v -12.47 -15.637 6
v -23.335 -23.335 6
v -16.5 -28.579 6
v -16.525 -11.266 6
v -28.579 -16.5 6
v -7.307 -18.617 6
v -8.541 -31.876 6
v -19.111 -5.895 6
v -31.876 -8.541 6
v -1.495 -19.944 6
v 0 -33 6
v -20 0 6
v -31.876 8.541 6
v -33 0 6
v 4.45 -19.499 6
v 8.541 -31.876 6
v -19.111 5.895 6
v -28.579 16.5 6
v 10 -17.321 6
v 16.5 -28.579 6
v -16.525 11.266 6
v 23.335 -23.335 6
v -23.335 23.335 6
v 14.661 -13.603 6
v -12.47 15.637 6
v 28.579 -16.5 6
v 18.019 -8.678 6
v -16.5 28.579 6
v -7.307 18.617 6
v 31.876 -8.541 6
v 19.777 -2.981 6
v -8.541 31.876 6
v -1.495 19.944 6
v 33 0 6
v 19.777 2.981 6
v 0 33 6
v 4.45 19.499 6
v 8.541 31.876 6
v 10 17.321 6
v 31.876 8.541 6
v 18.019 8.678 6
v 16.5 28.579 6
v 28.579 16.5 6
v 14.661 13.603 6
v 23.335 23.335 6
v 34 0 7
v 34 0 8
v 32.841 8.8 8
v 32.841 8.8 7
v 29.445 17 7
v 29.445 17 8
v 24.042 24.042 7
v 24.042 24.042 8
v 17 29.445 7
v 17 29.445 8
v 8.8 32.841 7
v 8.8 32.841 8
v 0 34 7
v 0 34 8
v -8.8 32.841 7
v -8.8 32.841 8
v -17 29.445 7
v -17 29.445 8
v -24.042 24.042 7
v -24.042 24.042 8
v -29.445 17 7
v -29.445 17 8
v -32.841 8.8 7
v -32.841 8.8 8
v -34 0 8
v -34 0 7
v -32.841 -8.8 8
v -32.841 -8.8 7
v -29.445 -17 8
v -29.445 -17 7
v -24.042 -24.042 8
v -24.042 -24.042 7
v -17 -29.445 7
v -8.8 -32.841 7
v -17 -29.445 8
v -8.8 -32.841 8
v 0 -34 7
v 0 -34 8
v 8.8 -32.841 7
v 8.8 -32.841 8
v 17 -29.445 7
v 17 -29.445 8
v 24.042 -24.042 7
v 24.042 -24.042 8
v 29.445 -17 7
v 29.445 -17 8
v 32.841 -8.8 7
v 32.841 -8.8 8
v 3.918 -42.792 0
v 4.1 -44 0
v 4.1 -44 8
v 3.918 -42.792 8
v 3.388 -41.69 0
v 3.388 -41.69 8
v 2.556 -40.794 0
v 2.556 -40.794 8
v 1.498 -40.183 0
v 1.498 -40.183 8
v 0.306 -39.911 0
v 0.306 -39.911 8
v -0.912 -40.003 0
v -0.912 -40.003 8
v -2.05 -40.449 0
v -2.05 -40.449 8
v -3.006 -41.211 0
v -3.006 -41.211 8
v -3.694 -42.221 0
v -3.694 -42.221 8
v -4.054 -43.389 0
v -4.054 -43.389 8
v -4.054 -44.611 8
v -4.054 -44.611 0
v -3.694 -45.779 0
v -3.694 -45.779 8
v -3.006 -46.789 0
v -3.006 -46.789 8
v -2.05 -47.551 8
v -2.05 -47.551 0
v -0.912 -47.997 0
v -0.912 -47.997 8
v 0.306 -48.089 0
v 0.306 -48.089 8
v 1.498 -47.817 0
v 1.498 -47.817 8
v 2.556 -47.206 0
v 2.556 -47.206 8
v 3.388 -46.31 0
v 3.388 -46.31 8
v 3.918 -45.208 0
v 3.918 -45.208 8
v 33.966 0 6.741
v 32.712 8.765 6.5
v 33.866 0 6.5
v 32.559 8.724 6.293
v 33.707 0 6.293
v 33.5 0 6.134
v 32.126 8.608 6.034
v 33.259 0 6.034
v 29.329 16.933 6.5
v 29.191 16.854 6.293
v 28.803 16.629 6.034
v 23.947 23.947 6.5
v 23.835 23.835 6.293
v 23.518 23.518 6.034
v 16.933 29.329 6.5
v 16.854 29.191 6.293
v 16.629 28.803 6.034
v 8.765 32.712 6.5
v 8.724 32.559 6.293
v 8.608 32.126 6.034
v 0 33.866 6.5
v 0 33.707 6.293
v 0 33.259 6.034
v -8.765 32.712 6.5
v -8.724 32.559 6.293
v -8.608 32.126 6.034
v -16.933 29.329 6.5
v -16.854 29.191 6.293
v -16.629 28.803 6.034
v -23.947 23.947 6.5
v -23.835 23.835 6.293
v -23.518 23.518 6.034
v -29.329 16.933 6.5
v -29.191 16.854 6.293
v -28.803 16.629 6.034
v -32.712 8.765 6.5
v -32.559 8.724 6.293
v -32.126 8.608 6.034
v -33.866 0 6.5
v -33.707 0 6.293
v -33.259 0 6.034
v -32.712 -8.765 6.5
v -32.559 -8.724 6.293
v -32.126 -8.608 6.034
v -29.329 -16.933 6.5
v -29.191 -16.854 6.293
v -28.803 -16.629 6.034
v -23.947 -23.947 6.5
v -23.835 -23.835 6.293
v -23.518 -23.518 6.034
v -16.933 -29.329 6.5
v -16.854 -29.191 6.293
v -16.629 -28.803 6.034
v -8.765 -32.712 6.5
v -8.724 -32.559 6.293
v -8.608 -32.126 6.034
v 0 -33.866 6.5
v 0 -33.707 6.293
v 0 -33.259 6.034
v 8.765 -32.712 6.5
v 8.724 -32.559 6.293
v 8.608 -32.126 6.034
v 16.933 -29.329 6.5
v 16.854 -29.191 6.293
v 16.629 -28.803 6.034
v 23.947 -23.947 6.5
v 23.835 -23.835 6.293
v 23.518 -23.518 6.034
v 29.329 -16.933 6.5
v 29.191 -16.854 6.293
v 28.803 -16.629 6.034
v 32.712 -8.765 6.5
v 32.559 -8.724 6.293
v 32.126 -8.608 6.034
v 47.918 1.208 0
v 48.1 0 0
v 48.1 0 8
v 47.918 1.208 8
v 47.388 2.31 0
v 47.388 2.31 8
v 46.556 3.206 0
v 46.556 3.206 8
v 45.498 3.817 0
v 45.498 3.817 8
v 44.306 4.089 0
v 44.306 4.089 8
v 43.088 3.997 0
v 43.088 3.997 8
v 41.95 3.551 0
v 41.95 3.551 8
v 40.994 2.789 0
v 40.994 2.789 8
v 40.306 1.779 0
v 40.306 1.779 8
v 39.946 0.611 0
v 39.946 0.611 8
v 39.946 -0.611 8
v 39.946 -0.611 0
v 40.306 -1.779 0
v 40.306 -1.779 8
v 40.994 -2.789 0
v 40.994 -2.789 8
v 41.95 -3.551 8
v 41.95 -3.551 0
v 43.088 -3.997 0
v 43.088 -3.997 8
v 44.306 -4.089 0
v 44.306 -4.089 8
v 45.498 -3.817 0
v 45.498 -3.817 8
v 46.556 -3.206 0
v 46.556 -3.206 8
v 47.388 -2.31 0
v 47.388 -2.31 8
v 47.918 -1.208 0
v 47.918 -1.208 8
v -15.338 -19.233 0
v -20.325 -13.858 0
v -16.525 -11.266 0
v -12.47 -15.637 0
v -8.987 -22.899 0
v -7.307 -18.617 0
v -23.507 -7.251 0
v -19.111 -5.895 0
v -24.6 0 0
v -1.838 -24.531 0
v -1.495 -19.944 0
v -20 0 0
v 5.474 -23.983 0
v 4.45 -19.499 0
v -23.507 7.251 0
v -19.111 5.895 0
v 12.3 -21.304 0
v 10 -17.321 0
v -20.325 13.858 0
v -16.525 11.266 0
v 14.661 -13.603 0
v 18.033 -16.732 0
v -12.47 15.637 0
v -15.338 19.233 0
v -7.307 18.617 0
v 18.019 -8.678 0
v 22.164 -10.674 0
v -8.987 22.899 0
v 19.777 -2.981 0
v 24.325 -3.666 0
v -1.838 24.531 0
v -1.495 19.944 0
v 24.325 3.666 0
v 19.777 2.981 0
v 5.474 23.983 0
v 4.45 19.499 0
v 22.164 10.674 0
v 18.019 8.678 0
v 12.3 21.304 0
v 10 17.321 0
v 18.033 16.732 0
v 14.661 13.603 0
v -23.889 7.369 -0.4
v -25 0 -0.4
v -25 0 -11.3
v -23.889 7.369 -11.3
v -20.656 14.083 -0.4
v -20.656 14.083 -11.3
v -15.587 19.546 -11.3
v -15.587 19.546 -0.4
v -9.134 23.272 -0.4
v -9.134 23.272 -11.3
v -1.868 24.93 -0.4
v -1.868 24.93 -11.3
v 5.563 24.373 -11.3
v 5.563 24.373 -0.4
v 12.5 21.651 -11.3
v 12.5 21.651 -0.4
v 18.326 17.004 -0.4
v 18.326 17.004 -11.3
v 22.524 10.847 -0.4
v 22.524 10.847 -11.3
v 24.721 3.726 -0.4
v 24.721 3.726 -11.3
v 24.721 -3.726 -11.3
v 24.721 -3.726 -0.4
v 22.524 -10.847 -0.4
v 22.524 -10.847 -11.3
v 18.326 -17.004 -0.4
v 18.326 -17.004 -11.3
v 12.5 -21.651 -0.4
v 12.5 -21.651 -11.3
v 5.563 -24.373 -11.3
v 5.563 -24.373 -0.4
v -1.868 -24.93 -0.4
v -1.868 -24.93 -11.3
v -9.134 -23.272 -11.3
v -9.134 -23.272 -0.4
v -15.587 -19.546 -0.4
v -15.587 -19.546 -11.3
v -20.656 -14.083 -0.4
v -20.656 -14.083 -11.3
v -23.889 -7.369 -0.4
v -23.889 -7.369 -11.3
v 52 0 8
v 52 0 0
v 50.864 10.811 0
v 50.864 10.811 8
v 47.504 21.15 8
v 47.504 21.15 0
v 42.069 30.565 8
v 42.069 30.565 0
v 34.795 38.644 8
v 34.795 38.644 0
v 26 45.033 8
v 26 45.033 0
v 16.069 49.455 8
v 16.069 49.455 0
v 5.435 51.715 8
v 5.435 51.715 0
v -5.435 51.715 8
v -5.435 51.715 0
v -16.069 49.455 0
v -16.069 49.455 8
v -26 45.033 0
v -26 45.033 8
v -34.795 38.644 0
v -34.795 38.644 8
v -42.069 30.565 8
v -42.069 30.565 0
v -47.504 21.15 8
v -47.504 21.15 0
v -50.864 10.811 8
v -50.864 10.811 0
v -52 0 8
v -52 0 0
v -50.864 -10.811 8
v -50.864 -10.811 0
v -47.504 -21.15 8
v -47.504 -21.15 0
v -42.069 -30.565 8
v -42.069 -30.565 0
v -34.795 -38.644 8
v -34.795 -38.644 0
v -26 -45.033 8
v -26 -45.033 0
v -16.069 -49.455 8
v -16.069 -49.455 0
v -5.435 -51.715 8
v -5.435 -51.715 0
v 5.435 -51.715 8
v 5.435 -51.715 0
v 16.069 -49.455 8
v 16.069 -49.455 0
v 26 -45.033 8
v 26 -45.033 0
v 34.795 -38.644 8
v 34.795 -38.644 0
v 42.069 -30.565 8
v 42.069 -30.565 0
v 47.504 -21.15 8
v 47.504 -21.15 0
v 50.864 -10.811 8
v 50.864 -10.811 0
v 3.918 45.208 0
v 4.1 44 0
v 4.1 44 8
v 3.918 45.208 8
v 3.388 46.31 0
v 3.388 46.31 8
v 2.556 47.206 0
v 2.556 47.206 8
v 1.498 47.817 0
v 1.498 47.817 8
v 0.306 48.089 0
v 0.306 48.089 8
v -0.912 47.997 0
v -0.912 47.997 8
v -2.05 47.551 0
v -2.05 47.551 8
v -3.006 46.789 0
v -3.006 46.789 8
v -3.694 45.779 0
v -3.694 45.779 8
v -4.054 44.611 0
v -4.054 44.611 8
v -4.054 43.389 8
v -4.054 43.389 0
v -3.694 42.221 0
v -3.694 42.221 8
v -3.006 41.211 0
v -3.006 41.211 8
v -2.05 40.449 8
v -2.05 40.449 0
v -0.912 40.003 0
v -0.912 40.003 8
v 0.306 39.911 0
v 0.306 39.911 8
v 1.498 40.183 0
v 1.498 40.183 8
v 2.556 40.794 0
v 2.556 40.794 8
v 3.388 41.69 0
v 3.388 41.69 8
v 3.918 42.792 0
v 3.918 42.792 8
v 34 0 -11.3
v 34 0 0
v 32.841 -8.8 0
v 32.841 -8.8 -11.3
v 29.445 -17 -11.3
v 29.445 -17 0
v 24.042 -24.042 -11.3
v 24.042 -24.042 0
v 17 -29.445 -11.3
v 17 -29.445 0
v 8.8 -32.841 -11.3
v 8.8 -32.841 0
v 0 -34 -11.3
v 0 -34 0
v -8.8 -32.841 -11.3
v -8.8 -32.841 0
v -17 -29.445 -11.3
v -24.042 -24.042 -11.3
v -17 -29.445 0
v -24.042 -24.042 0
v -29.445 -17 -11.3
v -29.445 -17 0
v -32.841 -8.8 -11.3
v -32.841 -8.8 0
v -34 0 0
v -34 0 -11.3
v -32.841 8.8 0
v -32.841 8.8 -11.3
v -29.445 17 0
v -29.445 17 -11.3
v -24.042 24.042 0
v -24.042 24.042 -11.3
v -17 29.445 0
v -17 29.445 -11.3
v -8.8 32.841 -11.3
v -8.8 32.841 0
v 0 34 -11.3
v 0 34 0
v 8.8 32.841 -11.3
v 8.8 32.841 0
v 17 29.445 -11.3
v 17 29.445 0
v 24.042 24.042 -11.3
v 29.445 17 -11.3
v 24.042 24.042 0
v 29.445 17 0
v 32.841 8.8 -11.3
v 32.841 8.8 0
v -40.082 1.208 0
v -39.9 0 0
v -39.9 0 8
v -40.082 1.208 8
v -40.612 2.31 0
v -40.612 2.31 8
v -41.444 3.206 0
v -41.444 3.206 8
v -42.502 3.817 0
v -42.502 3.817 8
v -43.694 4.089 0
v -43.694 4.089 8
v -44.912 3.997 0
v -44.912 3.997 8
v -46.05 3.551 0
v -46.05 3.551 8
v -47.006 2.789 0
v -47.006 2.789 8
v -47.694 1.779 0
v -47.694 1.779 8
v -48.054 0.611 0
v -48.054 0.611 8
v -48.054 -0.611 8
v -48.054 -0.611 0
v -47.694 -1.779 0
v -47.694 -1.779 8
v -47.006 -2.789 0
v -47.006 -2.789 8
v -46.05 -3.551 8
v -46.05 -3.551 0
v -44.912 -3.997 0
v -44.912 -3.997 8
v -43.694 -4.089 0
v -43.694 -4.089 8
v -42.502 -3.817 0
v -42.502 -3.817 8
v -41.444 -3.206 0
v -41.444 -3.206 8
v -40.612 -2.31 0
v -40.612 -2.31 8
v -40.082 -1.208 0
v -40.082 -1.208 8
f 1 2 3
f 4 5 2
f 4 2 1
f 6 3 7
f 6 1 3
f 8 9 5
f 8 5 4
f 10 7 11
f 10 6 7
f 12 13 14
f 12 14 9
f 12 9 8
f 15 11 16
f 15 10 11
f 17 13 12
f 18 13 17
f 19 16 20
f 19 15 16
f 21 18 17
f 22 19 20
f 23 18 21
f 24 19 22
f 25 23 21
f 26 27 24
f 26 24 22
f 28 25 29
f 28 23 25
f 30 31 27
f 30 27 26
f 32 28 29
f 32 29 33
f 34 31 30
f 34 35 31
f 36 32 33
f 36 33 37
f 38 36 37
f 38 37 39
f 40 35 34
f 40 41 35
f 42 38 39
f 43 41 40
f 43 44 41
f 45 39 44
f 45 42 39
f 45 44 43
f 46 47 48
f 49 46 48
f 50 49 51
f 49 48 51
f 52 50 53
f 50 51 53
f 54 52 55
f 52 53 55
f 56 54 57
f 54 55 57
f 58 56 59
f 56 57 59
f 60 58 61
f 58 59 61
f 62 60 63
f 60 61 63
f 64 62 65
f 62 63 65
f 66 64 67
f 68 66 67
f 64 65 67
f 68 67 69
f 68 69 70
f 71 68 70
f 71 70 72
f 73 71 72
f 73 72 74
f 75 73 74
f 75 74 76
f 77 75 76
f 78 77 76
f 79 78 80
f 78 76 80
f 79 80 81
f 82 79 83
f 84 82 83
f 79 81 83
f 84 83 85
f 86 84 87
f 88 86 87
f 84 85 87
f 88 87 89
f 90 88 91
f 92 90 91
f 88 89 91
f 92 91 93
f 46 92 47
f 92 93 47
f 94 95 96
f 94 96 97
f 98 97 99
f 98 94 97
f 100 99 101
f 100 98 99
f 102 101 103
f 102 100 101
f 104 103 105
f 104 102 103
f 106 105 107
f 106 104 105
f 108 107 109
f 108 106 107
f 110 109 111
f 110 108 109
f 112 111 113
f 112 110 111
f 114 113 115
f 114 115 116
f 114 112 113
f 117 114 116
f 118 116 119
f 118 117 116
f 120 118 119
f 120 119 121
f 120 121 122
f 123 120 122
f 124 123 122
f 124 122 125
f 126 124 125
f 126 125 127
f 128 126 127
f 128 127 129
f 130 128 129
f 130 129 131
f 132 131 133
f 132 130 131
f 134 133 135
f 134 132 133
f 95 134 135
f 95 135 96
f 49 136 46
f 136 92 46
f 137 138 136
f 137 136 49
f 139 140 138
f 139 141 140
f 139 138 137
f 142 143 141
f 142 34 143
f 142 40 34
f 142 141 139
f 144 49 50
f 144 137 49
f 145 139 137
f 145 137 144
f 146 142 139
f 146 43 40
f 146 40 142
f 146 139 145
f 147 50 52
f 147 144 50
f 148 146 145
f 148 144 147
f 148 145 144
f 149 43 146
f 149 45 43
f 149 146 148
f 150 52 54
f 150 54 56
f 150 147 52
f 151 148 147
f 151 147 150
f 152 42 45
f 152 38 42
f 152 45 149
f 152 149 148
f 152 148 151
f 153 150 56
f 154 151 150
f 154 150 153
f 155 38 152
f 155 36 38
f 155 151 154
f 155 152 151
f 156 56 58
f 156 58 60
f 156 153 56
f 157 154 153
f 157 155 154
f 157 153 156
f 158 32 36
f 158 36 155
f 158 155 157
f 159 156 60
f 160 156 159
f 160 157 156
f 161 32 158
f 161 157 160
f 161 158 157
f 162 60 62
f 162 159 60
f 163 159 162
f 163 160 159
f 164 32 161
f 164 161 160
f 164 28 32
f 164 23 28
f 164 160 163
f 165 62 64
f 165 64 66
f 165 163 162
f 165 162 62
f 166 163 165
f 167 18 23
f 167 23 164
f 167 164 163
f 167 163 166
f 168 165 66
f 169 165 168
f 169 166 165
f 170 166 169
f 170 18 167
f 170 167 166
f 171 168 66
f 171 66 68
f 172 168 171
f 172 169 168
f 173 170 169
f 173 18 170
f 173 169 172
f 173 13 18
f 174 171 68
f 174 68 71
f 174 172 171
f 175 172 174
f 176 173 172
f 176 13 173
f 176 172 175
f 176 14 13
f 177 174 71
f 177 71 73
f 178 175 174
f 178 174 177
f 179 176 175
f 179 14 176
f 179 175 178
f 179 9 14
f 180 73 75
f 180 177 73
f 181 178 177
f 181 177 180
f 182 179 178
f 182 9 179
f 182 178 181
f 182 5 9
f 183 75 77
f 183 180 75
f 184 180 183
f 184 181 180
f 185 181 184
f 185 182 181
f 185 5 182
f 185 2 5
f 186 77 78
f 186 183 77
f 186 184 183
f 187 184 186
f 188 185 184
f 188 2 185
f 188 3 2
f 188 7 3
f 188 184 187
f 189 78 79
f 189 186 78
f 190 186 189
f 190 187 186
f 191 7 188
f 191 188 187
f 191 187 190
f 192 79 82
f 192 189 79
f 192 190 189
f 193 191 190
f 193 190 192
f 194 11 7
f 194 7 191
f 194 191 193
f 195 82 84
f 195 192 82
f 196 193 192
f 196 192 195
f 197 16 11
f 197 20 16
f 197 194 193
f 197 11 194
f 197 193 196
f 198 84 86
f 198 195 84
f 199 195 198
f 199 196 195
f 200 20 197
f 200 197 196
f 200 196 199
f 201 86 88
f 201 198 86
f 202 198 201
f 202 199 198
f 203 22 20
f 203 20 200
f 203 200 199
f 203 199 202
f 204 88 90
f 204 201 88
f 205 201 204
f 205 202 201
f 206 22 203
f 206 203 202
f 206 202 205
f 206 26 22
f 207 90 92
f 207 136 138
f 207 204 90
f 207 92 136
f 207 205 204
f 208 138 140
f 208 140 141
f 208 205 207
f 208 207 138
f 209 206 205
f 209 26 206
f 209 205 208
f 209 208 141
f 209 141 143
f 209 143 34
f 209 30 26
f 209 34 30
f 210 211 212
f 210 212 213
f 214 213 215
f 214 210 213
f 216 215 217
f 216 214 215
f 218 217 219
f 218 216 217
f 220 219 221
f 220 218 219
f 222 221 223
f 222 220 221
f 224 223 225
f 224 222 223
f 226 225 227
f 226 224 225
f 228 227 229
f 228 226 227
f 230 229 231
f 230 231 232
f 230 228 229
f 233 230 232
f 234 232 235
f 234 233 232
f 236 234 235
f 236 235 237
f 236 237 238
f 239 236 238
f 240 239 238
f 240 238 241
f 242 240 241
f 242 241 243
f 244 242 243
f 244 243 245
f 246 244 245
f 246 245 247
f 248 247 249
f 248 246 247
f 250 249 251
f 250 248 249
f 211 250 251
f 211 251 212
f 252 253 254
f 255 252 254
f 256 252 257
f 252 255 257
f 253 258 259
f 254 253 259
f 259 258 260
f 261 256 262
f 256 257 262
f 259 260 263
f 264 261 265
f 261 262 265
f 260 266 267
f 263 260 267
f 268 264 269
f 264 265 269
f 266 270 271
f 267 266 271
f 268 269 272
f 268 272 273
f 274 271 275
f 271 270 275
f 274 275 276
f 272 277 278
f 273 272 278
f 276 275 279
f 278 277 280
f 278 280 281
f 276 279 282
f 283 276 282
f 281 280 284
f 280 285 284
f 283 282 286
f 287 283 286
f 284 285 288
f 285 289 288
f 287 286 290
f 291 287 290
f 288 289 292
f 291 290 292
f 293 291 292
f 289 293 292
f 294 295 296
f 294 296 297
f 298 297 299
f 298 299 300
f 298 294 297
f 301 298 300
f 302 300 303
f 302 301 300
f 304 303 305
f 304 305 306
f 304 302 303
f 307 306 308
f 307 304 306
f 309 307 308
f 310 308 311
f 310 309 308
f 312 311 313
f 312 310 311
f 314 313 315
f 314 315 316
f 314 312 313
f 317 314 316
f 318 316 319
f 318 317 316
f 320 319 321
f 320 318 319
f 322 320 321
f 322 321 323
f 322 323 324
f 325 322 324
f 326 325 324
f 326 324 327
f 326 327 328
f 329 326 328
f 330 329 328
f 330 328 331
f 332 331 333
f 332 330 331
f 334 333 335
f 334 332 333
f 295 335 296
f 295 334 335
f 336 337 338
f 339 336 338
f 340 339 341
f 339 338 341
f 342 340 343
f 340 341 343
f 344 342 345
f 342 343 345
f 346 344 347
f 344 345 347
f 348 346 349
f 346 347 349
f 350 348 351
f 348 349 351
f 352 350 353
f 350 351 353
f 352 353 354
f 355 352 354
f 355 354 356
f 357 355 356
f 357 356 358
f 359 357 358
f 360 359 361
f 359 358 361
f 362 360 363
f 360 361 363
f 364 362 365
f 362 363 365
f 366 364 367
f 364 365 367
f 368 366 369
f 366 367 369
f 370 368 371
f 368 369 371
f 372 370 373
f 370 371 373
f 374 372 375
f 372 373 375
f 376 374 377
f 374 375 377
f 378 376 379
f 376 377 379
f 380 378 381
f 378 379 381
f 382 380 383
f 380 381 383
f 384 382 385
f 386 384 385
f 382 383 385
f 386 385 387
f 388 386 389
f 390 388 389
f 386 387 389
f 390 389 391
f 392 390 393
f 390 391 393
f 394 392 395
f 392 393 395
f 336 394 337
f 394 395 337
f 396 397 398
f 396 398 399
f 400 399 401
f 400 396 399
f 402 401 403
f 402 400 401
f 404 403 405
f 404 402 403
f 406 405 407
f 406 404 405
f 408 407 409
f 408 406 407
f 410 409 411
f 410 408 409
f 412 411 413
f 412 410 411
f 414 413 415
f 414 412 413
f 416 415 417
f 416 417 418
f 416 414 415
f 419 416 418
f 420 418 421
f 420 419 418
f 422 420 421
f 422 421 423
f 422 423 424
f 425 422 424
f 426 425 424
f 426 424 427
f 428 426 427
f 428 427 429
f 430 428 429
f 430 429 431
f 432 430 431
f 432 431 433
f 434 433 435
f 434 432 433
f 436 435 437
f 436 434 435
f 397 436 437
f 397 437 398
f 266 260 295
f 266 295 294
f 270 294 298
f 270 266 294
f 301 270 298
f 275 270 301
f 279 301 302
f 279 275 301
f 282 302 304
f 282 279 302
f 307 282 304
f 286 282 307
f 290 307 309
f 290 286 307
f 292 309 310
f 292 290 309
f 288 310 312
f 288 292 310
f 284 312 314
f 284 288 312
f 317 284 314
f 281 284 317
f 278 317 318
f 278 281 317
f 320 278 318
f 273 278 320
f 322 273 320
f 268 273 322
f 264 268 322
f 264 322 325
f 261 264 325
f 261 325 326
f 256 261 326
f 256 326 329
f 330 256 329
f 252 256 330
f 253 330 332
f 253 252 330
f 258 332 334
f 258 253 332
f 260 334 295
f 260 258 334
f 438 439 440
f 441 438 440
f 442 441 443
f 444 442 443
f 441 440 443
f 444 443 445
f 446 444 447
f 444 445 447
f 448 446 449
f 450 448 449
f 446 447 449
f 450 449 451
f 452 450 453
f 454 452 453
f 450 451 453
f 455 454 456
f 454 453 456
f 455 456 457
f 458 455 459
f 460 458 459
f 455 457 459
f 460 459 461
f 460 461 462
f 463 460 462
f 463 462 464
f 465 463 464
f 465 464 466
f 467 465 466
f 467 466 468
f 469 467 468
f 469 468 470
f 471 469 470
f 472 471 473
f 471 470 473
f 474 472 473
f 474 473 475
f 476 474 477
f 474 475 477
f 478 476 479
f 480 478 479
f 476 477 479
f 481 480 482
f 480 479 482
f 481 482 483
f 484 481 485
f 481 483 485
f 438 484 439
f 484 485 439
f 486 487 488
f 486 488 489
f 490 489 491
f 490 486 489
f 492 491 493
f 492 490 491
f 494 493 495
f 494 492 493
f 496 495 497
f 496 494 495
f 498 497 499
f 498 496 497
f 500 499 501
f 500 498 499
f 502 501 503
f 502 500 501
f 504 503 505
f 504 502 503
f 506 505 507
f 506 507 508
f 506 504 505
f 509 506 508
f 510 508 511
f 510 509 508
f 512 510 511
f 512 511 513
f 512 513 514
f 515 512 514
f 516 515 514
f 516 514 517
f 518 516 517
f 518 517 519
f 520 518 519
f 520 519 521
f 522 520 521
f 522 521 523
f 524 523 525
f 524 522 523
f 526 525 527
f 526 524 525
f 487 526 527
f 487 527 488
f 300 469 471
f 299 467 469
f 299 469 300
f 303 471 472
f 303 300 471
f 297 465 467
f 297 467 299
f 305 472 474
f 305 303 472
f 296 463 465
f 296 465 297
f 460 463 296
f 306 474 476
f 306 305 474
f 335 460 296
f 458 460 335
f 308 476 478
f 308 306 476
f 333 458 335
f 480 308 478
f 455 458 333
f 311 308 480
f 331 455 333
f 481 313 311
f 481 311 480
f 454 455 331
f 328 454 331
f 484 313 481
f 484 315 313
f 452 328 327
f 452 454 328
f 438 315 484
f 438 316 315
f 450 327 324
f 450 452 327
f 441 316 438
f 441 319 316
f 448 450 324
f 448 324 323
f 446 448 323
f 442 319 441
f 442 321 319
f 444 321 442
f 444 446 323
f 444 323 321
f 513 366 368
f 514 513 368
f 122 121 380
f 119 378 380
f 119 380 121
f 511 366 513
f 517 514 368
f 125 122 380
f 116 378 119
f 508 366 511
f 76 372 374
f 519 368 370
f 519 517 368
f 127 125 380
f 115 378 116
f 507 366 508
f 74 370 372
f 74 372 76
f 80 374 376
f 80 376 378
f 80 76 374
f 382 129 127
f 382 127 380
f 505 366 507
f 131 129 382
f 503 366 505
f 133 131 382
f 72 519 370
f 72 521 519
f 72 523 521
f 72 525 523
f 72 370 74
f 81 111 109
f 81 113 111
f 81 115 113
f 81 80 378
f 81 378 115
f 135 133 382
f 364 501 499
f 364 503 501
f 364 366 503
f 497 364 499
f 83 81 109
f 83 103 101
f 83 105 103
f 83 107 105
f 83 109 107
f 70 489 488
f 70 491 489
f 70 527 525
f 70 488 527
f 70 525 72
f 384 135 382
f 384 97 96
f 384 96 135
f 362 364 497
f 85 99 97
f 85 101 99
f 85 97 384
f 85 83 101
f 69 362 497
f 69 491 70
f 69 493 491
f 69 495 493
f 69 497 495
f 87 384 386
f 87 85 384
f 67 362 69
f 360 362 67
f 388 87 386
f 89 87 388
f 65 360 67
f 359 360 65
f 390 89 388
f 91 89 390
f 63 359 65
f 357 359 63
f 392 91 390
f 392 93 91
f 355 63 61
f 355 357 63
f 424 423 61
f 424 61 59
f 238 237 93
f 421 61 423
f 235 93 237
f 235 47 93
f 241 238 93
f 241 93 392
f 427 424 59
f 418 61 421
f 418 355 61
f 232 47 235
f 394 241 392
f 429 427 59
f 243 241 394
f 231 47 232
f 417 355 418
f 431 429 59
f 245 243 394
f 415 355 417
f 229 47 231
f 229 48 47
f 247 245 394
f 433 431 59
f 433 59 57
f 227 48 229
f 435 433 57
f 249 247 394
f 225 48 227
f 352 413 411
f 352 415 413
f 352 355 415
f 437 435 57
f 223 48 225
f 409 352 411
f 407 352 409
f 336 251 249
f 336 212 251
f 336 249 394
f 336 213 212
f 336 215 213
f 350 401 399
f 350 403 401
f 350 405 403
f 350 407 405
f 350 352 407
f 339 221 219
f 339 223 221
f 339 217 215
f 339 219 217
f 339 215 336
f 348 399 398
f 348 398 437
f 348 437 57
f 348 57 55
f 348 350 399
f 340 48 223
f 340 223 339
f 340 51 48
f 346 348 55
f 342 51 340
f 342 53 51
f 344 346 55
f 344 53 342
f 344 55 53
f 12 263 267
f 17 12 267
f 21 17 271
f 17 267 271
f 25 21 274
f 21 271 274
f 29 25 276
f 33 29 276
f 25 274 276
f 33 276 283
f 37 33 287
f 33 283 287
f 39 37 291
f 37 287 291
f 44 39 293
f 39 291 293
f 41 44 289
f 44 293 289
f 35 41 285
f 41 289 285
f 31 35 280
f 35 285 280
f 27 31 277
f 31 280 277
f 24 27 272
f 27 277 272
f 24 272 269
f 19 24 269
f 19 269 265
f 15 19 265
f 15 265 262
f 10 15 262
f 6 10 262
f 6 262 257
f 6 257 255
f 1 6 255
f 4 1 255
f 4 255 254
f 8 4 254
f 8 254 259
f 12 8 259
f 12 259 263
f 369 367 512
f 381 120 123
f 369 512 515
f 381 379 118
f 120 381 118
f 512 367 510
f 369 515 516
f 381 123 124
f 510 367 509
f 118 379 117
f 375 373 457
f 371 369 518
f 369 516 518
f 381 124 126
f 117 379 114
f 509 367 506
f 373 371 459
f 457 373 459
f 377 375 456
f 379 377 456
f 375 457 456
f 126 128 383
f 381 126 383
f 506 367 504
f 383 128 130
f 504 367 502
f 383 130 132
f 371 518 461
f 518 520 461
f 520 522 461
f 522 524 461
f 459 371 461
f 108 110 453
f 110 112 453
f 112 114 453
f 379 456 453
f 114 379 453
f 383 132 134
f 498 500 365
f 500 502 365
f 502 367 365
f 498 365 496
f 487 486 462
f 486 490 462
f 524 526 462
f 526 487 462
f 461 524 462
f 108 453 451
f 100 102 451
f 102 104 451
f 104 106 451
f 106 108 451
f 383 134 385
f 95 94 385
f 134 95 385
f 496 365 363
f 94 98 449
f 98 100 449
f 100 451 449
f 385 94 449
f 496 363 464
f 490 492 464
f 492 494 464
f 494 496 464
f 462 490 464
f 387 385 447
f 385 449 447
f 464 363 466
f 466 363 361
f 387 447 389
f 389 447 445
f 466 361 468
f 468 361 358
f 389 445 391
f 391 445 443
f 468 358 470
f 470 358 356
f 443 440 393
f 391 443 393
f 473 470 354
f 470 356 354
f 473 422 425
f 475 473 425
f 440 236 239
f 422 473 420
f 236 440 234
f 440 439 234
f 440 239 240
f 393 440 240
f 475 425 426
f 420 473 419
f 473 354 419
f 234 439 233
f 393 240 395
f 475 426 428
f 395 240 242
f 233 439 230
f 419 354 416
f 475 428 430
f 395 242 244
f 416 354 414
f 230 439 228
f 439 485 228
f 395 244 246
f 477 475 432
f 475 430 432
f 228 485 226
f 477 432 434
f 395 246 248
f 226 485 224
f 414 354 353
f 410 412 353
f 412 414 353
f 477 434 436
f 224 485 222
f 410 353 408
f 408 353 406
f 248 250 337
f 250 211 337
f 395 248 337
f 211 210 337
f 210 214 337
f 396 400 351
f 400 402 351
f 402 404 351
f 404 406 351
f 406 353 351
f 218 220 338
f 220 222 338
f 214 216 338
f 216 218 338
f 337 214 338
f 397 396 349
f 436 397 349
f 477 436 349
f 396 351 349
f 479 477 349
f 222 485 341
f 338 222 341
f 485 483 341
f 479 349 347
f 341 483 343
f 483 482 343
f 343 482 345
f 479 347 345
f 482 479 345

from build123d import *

# Parameters (mm, degrees)
SKETCH_1_R          = 52
SKETCH_1_R_2        = 4.1
EXTRUDE_1_DEPTH     = 8
SKETCH_2_R          = 34
CUT_EXTRUDE_1_DEPTH = 2
FILLET_1_R          = 1
SKETCH_3_R          = 34
SKETCH_3_R_2        = 25
EXTRUDE_2_DEPTH     = 11.3
CHAMFER_1_SIZE      = 0.4
SKETCH_4_R          = 20
CUT_EXTRUDE_2_DEPTH = 10


with BuildPart() as part:
    # Эскиз1 → Бобышка-Вытянуть1 (new body)
    with BuildSketch(Plane.XY):
        Circle(SKETCH_1_R)
        with Locations((0, 44)):
            Circle(SKETCH_1_R_2, mode=Mode.SUBTRACT)
        with Locations((44, 0)):
            Circle(SKETCH_1_R_2, mode=Mode.SUBTRACT)
        with Locations((0, -44)):
            Circle(SKETCH_1_R_2, mode=Mode.SUBTRACT)
        with Locations((-44, 0)):
            Circle(SKETCH_1_R_2, mode=Mode.SUBTRACT)
    extrude(amount=EXTRUDE_1_DEPTH)

    # Эскиз2 → Вырез-Вытянуть1 (cut)
    with BuildSketch(Plane.XY.offset(8)):
        Circle(SKETCH_2_R)
    extrude(amount=-CUT_EXTRUDE_1_DEPTH, mode=Mode.SUBTRACT)

    # Скругление1
    fillet_1_edges = [part.edges().sort_by_distance(p)[0] for p in [
        (-34, 0, 6),
    ]]
    fillet(fillet_1_edges, radius=FILLET_1_R)

    # Эскиз3 → Бобышка-Вытянуть2 (add)
    with BuildSketch(Plane(origin=(0, 0, 0), x_dir=(-1, 0, 0), z_dir=(0, 0, -1))):
        with Locations(Location((0, 0, 0), (0, 0, 180))):
            Circle(SKETCH_3_R)
        Circle(SKETCH_3_R_2, mode=Mode.SUBTRACT)
    extrude(amount=EXTRUDE_2_DEPTH)

    # Фаска1
    chamfer_1_edges = [part.edges().sort_by_distance(p)[0] for p in [
        (25, 0, 0),
    ]]
    chamfer(chamfer_1_edges, length=CHAMFER_1_SIZE)

    # Эскиз4 → Вырез-Вытянуть2 (cut)
    with BuildSketch(Plane(origin=(0, 0, 0), x_dir=(-1, 0, 0), z_dir=(0, 0, -1))):
        Circle(SKETCH_4_R)
    extrude(amount=-CUT_EXTRUDE_2_DEPTH, mode=Mode.SUBTRACT)


solid = part.part
